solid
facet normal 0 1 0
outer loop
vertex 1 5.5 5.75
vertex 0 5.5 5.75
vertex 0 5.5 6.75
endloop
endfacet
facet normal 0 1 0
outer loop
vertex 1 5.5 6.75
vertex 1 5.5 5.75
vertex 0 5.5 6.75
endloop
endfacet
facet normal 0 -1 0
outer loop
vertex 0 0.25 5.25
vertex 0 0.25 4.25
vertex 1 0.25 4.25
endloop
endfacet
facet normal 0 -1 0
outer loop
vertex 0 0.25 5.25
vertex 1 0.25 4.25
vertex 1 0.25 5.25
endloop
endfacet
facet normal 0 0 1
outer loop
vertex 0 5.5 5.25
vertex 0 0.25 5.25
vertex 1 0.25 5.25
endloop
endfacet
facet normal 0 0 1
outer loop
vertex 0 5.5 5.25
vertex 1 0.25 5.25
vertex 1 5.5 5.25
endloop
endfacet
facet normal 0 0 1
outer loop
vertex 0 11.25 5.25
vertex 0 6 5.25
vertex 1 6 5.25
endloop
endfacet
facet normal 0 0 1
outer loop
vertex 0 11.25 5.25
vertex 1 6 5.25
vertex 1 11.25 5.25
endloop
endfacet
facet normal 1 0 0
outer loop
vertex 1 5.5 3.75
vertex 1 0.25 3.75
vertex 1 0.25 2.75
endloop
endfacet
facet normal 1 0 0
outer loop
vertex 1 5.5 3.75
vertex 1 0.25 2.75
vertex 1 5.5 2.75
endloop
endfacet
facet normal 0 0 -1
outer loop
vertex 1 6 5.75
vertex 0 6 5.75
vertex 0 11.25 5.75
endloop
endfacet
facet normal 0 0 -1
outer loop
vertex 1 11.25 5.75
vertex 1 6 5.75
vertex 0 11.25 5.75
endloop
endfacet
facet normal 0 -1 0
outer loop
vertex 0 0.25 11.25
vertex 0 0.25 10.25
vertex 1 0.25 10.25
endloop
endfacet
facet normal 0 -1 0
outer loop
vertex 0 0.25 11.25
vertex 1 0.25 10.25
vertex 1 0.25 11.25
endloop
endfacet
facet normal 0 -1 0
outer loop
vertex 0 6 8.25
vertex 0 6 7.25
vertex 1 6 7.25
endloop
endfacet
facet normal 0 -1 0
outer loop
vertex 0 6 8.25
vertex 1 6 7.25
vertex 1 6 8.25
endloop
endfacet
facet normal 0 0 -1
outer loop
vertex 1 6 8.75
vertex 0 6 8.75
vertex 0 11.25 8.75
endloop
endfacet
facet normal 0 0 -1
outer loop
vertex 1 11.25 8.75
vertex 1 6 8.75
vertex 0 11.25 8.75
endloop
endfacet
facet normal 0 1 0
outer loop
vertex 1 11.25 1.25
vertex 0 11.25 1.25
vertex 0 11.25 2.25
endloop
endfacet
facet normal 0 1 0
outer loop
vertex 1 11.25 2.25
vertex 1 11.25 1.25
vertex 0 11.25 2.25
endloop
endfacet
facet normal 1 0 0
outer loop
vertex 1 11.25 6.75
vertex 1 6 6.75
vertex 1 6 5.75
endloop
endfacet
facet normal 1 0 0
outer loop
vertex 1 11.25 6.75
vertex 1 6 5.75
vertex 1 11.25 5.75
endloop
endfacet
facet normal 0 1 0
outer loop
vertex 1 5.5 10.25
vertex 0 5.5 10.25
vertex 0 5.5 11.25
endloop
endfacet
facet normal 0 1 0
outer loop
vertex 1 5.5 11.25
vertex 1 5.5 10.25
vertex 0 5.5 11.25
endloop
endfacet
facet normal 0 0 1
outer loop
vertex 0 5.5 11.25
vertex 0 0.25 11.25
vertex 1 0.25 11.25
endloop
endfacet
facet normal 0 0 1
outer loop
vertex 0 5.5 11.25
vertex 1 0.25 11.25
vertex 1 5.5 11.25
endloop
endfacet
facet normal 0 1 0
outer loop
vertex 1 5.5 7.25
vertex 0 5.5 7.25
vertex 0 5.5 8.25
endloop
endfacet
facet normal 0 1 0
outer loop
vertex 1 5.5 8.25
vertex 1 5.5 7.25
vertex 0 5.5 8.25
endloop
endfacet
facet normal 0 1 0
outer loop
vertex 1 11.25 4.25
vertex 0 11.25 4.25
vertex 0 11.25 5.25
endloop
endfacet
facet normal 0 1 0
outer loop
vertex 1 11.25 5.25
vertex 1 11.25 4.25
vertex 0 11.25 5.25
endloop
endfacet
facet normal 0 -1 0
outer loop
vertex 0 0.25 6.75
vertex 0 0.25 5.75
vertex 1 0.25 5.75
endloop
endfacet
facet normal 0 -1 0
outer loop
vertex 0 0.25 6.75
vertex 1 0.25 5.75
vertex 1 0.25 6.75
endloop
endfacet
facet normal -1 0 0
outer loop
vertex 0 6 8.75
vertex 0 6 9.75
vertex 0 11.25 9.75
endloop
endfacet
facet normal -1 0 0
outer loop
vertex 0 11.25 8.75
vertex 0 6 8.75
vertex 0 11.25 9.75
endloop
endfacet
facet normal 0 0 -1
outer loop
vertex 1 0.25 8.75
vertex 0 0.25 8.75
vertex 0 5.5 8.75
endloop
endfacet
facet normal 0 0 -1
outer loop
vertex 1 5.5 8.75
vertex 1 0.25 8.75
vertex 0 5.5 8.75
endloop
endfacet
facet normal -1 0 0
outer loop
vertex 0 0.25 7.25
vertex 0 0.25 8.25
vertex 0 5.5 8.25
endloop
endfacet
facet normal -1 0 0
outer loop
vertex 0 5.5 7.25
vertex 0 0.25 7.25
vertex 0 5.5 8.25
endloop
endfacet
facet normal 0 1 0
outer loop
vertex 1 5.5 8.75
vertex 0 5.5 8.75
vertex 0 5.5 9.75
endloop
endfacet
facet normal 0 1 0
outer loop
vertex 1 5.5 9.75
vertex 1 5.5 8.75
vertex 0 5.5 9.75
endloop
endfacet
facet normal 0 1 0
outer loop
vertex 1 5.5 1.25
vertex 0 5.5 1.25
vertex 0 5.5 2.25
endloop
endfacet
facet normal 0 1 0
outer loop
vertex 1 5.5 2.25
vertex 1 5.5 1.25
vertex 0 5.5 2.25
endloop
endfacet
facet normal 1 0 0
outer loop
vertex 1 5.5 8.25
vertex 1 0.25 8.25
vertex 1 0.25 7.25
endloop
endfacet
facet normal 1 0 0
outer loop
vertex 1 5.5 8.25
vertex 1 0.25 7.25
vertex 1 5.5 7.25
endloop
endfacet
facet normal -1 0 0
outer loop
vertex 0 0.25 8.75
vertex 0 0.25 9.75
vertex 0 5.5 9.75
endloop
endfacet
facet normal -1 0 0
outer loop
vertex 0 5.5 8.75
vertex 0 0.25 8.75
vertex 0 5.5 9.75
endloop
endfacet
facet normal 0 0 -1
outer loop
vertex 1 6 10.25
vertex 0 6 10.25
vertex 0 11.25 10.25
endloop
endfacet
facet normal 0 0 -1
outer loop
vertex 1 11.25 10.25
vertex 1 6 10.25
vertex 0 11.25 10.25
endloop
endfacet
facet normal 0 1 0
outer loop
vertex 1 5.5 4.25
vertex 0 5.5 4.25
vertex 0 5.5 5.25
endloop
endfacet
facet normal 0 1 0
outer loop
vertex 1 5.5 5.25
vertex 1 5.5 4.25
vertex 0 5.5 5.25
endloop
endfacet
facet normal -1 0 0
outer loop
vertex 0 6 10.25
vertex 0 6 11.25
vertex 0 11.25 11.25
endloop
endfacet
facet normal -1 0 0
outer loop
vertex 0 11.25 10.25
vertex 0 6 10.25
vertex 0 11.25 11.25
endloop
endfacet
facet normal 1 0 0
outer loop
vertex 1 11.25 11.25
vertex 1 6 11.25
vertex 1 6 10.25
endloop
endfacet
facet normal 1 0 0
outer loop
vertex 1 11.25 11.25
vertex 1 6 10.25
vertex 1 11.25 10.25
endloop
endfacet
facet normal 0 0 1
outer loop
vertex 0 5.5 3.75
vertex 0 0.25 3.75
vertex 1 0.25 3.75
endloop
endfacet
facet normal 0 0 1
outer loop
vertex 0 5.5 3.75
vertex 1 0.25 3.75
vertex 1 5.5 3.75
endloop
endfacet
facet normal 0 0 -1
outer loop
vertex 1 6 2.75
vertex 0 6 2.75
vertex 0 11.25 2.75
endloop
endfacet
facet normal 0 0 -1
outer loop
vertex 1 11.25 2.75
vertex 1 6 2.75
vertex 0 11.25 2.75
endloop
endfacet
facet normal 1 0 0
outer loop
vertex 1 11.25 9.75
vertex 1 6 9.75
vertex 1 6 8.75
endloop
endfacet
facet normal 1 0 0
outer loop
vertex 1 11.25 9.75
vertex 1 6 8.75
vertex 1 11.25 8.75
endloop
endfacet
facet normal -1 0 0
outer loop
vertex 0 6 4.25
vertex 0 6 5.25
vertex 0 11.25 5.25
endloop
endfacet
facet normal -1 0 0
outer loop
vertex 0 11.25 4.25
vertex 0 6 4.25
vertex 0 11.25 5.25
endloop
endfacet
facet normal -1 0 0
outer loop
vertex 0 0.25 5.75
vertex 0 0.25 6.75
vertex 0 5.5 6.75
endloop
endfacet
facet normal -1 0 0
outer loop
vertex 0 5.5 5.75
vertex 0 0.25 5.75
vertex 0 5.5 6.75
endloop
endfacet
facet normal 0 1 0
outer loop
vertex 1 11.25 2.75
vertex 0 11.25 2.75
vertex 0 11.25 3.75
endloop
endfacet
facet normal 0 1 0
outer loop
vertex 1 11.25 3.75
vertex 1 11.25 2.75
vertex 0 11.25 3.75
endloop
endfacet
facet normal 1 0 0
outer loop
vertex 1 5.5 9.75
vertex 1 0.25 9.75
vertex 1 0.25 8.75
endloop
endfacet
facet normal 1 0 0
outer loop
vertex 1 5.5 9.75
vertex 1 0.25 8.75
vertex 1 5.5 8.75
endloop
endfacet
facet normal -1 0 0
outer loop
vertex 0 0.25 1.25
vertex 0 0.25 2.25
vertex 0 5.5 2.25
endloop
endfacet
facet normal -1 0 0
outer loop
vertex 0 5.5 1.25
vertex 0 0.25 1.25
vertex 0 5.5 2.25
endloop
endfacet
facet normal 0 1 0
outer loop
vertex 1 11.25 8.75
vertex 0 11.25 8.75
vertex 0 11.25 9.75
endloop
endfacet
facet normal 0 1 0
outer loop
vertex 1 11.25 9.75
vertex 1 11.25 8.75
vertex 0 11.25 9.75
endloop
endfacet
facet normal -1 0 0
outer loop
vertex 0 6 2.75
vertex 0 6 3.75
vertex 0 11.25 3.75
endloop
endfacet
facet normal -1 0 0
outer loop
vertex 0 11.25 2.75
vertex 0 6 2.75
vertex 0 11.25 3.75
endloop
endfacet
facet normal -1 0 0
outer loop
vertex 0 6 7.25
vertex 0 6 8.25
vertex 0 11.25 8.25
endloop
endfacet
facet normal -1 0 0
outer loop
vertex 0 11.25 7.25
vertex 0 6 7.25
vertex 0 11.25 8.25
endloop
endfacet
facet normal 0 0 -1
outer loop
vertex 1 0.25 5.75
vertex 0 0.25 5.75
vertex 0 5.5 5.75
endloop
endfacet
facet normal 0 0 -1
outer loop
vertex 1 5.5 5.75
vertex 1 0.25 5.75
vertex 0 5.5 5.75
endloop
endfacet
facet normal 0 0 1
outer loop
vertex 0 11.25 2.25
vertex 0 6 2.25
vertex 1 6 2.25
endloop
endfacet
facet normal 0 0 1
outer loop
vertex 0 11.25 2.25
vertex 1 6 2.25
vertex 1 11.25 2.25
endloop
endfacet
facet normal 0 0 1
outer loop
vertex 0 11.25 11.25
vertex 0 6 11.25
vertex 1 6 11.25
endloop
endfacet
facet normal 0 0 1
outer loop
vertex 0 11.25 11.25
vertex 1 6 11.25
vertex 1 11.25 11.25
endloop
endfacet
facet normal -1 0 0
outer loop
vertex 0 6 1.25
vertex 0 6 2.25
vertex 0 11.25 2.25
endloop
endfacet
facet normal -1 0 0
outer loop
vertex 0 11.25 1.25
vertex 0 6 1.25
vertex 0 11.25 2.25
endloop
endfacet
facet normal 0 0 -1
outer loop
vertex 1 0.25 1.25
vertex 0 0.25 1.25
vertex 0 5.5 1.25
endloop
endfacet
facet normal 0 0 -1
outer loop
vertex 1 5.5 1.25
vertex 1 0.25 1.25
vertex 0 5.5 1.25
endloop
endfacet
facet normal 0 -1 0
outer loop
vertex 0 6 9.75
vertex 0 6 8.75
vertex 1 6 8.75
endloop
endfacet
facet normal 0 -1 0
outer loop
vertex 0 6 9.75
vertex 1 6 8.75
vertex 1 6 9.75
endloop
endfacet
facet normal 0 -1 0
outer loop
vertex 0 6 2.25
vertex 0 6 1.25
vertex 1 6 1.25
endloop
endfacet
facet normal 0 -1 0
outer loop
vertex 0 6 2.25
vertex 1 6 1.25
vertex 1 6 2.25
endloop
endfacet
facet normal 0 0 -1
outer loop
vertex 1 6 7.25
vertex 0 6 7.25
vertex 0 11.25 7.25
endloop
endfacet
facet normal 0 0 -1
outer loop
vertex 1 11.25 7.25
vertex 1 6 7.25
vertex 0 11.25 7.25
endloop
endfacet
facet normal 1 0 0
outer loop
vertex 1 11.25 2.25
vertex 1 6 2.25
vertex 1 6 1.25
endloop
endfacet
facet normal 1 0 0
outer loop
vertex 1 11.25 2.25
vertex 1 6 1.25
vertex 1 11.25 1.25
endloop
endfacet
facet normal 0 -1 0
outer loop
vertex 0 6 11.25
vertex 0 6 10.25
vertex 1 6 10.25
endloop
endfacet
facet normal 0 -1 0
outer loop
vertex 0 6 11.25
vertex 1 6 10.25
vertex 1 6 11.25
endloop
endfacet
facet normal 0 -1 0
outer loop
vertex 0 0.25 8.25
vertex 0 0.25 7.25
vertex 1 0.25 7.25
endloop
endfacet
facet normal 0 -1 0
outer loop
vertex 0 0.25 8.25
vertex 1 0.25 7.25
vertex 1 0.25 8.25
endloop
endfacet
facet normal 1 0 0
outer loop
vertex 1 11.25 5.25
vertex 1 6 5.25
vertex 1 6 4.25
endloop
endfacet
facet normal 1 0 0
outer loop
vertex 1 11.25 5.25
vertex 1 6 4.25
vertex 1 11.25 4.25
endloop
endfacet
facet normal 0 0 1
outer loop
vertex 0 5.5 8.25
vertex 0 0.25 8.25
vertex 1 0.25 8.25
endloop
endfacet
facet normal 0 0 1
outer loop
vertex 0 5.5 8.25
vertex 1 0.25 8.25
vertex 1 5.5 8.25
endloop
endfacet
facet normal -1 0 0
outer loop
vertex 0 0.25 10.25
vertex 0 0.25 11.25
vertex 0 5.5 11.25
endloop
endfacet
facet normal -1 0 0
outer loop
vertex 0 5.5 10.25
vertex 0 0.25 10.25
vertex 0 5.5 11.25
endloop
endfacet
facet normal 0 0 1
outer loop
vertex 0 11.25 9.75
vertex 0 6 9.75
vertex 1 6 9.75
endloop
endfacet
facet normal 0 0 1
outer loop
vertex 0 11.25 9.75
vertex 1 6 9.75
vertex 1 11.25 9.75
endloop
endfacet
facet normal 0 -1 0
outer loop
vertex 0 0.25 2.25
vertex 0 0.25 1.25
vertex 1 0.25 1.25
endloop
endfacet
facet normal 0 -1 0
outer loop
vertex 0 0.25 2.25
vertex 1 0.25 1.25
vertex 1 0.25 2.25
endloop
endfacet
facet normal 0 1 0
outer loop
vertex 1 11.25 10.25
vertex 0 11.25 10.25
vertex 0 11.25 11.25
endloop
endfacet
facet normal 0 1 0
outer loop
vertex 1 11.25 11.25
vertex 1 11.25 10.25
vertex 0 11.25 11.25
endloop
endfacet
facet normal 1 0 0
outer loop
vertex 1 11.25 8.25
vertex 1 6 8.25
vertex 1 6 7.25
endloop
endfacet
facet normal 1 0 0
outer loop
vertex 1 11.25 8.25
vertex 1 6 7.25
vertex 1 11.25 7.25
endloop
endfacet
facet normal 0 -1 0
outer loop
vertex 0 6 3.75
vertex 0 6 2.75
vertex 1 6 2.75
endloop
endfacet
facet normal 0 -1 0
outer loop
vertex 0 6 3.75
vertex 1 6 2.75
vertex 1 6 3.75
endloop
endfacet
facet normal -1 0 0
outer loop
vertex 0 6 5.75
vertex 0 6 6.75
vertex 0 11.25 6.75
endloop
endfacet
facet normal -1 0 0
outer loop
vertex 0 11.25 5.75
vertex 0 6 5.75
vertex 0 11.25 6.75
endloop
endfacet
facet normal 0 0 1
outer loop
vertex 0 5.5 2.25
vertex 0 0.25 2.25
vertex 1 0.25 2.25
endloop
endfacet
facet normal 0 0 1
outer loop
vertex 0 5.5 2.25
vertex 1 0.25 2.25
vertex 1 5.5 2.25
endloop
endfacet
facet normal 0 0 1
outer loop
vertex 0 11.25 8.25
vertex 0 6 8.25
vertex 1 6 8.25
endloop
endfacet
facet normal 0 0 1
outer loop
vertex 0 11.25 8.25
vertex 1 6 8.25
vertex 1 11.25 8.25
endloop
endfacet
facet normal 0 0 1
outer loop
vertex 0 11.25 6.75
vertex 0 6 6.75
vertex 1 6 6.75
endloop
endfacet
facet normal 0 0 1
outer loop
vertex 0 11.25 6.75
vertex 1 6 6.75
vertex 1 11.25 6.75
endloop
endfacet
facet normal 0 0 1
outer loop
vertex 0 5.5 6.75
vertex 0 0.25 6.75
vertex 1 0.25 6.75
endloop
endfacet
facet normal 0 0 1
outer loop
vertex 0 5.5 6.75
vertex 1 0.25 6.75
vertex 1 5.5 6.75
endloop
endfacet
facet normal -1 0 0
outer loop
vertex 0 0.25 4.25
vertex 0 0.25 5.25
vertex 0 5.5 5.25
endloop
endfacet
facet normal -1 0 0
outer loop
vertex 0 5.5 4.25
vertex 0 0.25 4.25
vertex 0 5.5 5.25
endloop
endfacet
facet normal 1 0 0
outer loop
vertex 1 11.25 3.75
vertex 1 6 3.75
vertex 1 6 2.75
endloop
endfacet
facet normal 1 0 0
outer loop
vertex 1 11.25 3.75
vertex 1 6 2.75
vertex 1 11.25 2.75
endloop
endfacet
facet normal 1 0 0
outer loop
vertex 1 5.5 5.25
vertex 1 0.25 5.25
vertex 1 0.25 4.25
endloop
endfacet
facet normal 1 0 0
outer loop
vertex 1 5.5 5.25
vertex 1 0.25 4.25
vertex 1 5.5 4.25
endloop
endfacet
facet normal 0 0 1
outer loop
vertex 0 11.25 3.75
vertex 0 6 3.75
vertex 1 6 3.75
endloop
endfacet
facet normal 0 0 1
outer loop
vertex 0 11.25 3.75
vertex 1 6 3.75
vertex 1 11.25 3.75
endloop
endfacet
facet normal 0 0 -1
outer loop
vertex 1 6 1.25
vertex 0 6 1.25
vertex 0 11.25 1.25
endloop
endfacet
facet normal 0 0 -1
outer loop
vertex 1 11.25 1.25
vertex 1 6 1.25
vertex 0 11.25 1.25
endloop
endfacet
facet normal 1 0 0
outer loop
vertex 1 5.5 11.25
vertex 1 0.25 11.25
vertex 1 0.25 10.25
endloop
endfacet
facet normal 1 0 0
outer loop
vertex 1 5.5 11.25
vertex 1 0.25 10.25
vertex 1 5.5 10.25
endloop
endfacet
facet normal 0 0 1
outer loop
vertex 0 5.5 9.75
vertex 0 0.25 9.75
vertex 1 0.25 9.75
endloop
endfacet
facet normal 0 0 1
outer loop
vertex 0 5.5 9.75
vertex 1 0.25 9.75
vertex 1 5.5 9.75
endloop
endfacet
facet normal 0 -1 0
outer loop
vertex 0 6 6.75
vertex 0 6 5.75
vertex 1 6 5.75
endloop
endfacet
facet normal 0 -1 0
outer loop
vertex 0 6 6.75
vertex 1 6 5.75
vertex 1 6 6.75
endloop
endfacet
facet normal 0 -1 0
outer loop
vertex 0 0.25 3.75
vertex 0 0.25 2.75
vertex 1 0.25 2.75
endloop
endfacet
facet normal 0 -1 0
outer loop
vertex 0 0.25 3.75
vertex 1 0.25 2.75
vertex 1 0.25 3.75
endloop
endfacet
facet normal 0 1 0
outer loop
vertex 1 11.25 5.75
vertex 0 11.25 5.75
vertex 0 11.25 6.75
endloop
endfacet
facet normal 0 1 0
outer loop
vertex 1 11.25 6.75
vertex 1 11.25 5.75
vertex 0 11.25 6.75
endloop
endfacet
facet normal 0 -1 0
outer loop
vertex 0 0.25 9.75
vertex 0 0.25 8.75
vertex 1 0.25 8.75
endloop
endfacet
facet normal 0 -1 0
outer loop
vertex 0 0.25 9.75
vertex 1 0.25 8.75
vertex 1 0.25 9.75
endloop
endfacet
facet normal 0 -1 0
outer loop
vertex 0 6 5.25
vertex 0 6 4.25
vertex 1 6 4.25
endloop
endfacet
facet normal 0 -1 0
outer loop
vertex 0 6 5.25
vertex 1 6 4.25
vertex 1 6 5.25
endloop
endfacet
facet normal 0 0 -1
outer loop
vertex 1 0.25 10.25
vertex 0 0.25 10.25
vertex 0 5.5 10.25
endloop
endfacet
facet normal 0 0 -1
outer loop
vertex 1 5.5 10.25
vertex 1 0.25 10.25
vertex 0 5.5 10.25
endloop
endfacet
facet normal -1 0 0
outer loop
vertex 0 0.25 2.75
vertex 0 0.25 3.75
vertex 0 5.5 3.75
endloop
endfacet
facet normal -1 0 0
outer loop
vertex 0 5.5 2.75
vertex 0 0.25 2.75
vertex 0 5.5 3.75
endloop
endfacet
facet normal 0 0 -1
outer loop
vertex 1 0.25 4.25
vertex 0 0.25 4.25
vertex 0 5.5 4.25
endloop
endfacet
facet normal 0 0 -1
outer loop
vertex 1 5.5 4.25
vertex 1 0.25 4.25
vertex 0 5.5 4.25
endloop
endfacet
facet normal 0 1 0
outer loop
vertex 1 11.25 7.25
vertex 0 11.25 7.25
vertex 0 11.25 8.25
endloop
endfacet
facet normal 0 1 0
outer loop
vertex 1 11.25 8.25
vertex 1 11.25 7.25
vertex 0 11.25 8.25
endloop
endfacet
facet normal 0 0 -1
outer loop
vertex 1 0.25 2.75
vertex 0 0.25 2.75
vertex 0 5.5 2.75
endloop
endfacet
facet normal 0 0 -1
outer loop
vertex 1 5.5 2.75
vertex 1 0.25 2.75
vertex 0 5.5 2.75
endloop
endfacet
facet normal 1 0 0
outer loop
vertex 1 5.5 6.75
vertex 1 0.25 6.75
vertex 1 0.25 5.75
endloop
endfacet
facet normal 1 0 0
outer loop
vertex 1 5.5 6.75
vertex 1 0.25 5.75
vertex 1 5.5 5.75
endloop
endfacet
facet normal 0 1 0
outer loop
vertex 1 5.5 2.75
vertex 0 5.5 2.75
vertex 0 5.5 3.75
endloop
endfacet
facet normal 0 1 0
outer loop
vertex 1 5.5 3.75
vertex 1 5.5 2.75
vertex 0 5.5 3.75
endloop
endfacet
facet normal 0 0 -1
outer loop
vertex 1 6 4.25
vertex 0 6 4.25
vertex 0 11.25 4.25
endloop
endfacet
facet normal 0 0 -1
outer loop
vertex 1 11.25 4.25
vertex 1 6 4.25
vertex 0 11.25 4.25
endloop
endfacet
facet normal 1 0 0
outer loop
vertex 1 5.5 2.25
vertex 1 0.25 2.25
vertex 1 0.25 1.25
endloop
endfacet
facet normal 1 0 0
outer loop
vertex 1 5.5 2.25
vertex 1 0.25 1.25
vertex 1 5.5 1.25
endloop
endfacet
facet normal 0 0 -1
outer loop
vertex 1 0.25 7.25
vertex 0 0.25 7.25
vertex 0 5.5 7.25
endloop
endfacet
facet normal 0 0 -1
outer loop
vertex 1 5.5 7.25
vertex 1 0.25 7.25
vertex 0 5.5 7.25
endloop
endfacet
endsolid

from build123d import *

# Parameters (mm, degrees)
F0_W     = 5.25
F0_H     = 1
F1_DEPTH = 1


with BuildPart() as f1:
    # F0 (on Right) → F1 (new body)
    with BuildSketch(Plane.YZ):
        with Locations((2.875, 10.75)):
            Rectangle(F0_W, F0_H)
        with Locations((8.625, 10.75)):
            Rectangle(F0_W, F0_H)
        with Locations((2.875, 9.25)):
            Rectangle(F0_W, F0_H)
        with Locations((8.625, 9.25)):
            Rectangle(F0_W, F0_H)
        with Locations((2.875, 7.75)):
            Rectangle(F0_W, F0_H)
        with Locations((8.625, 7.75)):
            Rectangle(F0_W, F0_H)
        with Locations((2.875, 6.25)):
            Rectangle(F0_W, F0_H)
        with Locations((8.625, 6.25)):
            Rectangle(F0_W, F0_H)
        with Locations((2.875, 4.75)):
            Rectangle(F0_W, F0_H)
        with Locations((8.625, 4.75)):
            Rectangle(F0_W, F0_H)
        with Locations((8.625, 3.25)):
            Rectangle(F0_W, F0_H)
        with Locations((2.875, 3.25)):
            Rectangle(F0_W, F0_H)
        with Locations((2.875, 1.75)):
            Rectangle(F0_W, F0_H)
        with Locations((8.625, 1.75)):
            Rectangle(F0_W, F0_H)
    extrude(amount=F1_DEPTH)


solid = f1.part
